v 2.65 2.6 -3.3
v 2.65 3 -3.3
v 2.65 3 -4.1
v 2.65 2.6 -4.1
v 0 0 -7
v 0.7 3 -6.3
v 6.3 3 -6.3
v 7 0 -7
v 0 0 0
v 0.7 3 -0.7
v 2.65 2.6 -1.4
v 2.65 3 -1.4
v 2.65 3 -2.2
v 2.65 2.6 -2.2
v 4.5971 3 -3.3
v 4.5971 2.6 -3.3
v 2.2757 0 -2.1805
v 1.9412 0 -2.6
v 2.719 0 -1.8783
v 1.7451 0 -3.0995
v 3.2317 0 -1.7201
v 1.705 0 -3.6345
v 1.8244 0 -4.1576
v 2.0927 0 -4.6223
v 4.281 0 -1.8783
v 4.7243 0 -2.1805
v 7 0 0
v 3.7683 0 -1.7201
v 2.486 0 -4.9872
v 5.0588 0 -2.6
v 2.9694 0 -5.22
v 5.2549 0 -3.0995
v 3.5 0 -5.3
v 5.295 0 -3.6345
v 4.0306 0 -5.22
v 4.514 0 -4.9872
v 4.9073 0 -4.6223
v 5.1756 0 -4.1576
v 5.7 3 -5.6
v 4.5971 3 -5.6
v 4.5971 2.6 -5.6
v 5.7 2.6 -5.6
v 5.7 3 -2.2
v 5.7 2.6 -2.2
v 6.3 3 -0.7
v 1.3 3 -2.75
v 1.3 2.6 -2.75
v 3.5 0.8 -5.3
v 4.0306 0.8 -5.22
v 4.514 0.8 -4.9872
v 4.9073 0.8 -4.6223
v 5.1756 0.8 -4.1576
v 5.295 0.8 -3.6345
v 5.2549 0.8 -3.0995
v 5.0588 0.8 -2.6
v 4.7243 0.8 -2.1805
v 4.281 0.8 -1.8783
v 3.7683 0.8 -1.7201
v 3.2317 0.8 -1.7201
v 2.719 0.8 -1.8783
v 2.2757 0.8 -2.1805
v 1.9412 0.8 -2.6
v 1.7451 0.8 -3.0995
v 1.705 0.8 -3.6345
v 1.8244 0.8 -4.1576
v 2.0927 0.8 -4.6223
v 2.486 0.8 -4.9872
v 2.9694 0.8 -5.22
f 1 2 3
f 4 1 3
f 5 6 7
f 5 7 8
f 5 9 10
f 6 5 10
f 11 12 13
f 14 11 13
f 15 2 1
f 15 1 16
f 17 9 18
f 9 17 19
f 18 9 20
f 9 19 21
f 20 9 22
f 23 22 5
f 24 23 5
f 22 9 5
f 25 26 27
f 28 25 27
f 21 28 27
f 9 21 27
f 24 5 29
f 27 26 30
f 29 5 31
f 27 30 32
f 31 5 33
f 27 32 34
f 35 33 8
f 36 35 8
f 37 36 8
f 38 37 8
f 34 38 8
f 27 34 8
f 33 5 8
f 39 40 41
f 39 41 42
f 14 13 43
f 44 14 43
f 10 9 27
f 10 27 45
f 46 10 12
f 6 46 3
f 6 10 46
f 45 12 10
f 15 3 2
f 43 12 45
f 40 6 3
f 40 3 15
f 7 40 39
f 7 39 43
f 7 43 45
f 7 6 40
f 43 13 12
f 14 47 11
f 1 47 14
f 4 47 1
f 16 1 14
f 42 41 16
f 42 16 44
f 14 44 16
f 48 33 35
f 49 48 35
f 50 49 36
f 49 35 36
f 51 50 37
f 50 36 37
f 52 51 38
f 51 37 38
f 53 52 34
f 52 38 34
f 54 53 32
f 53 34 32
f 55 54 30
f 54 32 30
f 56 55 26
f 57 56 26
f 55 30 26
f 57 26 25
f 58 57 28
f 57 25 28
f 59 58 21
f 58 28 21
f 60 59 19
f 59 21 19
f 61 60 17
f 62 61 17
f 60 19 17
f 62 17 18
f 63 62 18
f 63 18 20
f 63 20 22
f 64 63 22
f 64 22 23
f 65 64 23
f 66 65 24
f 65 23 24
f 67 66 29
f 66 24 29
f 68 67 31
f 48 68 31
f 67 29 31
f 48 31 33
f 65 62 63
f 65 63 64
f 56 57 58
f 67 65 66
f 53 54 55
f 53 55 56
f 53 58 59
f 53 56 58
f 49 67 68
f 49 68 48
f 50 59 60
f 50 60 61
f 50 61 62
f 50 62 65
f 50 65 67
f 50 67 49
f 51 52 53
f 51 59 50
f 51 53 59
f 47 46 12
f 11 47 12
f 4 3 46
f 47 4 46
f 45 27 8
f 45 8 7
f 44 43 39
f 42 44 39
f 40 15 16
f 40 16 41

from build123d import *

# Parameters (mm, degrees)
SKETCH1_W           = 7
SKETCH1_H           = 7
BOSS_EXTRUDE1_DEPTH = 3
CUT_EXTRUDE1_DEPTH  = 7
CUT_EXTRUDE2_DEPTH  = 11
SKETCH4_R           = 1.8
CUT_EXTRUDE3_DEPTH  = 0.8
SKETCH5_W           = 1.947102418
SKETCH5_H           = 1.1
SKETCH5_W_2         = 1.102897582
SKETCH5_H_2         = 3.4
CUT_EXTRUDE4_DEPTH  = 0.4


with BuildPart() as part:
    # Sketch1 → Boss-Extrude1 (new body)
    with BuildSketch(Plane(origin=(0, 0, 0), x_dir=(1, 0, 0), z_dir=(0, 1, 0))):
        with Locations((3.5, 3.5)):
            Rectangle(SKETCH1_W, SKETCH1_H)
    extrude(amount=BOSS_EXTRUDE1_DEPTH)

    # Sketch2 → Cut-Extrude1 (cut)
    with BuildSketch(Plane.XY):
        Polygon((0, 0), (0.7, 3), (0, 3), align=None)
        Polygon((7, 0), (6.3, 3), (7, 3), align=None)
    extrude(amount=-CUT_EXTRUDE1_DEPTH, mode=Mode.SUBTRACT)

    # Sketch3 → Cut-Extrude2 (cut)
    with BuildSketch(Plane(origin=(0, 0, 0), x_dir=(0, 0, -1), z_dir=(1, 0, 0))):
        Polygon((0, 0), (0.7, 3), (0, 3), align=None)
        Polygon((7, 3), (6.3, 3), (7, 0), align=None)
    extrude(amount=CUT_EXTRUDE2_DEPTH, mode=Mode.SUBTRACT)

    # Sketch4 → Cut-Extrude3 (cut)
    with BuildSketch(Plane.XZ):
        with Locations(Location((3.5, -3.5, 0), (0, 0, 270))):
            Circle(SKETCH4_R)
    extrude(amount=-CUT_EXTRUDE3_DEPTH, mode=Mode.SUBTRACT)

    # Sketch5 → Cut-Extrude4 (cut)
    with BuildSketch(Plane(origin=(0, 3, 0), x_dir=(1, 0, 0), z_dir=(0, 1, 0))):
        Polygon((1.3, 2.75), (2.65, 1.4), (2.65, 2.2), (2.65, 3.3), (2.65, 4.1), align=None)
        with Locations((3.623551209, 2.75)):
            Rectangle(SKETCH5_W, SKETCH5_H)
        with Locations((5.148551209, 3.9)):
            Rectangle(SKETCH5_W_2, SKETCH5_H_2)
    extrude(amount=-CUT_EXTRUDE4_DEPTH, mode=Mode.SUBTRACT)


solid = part.part
